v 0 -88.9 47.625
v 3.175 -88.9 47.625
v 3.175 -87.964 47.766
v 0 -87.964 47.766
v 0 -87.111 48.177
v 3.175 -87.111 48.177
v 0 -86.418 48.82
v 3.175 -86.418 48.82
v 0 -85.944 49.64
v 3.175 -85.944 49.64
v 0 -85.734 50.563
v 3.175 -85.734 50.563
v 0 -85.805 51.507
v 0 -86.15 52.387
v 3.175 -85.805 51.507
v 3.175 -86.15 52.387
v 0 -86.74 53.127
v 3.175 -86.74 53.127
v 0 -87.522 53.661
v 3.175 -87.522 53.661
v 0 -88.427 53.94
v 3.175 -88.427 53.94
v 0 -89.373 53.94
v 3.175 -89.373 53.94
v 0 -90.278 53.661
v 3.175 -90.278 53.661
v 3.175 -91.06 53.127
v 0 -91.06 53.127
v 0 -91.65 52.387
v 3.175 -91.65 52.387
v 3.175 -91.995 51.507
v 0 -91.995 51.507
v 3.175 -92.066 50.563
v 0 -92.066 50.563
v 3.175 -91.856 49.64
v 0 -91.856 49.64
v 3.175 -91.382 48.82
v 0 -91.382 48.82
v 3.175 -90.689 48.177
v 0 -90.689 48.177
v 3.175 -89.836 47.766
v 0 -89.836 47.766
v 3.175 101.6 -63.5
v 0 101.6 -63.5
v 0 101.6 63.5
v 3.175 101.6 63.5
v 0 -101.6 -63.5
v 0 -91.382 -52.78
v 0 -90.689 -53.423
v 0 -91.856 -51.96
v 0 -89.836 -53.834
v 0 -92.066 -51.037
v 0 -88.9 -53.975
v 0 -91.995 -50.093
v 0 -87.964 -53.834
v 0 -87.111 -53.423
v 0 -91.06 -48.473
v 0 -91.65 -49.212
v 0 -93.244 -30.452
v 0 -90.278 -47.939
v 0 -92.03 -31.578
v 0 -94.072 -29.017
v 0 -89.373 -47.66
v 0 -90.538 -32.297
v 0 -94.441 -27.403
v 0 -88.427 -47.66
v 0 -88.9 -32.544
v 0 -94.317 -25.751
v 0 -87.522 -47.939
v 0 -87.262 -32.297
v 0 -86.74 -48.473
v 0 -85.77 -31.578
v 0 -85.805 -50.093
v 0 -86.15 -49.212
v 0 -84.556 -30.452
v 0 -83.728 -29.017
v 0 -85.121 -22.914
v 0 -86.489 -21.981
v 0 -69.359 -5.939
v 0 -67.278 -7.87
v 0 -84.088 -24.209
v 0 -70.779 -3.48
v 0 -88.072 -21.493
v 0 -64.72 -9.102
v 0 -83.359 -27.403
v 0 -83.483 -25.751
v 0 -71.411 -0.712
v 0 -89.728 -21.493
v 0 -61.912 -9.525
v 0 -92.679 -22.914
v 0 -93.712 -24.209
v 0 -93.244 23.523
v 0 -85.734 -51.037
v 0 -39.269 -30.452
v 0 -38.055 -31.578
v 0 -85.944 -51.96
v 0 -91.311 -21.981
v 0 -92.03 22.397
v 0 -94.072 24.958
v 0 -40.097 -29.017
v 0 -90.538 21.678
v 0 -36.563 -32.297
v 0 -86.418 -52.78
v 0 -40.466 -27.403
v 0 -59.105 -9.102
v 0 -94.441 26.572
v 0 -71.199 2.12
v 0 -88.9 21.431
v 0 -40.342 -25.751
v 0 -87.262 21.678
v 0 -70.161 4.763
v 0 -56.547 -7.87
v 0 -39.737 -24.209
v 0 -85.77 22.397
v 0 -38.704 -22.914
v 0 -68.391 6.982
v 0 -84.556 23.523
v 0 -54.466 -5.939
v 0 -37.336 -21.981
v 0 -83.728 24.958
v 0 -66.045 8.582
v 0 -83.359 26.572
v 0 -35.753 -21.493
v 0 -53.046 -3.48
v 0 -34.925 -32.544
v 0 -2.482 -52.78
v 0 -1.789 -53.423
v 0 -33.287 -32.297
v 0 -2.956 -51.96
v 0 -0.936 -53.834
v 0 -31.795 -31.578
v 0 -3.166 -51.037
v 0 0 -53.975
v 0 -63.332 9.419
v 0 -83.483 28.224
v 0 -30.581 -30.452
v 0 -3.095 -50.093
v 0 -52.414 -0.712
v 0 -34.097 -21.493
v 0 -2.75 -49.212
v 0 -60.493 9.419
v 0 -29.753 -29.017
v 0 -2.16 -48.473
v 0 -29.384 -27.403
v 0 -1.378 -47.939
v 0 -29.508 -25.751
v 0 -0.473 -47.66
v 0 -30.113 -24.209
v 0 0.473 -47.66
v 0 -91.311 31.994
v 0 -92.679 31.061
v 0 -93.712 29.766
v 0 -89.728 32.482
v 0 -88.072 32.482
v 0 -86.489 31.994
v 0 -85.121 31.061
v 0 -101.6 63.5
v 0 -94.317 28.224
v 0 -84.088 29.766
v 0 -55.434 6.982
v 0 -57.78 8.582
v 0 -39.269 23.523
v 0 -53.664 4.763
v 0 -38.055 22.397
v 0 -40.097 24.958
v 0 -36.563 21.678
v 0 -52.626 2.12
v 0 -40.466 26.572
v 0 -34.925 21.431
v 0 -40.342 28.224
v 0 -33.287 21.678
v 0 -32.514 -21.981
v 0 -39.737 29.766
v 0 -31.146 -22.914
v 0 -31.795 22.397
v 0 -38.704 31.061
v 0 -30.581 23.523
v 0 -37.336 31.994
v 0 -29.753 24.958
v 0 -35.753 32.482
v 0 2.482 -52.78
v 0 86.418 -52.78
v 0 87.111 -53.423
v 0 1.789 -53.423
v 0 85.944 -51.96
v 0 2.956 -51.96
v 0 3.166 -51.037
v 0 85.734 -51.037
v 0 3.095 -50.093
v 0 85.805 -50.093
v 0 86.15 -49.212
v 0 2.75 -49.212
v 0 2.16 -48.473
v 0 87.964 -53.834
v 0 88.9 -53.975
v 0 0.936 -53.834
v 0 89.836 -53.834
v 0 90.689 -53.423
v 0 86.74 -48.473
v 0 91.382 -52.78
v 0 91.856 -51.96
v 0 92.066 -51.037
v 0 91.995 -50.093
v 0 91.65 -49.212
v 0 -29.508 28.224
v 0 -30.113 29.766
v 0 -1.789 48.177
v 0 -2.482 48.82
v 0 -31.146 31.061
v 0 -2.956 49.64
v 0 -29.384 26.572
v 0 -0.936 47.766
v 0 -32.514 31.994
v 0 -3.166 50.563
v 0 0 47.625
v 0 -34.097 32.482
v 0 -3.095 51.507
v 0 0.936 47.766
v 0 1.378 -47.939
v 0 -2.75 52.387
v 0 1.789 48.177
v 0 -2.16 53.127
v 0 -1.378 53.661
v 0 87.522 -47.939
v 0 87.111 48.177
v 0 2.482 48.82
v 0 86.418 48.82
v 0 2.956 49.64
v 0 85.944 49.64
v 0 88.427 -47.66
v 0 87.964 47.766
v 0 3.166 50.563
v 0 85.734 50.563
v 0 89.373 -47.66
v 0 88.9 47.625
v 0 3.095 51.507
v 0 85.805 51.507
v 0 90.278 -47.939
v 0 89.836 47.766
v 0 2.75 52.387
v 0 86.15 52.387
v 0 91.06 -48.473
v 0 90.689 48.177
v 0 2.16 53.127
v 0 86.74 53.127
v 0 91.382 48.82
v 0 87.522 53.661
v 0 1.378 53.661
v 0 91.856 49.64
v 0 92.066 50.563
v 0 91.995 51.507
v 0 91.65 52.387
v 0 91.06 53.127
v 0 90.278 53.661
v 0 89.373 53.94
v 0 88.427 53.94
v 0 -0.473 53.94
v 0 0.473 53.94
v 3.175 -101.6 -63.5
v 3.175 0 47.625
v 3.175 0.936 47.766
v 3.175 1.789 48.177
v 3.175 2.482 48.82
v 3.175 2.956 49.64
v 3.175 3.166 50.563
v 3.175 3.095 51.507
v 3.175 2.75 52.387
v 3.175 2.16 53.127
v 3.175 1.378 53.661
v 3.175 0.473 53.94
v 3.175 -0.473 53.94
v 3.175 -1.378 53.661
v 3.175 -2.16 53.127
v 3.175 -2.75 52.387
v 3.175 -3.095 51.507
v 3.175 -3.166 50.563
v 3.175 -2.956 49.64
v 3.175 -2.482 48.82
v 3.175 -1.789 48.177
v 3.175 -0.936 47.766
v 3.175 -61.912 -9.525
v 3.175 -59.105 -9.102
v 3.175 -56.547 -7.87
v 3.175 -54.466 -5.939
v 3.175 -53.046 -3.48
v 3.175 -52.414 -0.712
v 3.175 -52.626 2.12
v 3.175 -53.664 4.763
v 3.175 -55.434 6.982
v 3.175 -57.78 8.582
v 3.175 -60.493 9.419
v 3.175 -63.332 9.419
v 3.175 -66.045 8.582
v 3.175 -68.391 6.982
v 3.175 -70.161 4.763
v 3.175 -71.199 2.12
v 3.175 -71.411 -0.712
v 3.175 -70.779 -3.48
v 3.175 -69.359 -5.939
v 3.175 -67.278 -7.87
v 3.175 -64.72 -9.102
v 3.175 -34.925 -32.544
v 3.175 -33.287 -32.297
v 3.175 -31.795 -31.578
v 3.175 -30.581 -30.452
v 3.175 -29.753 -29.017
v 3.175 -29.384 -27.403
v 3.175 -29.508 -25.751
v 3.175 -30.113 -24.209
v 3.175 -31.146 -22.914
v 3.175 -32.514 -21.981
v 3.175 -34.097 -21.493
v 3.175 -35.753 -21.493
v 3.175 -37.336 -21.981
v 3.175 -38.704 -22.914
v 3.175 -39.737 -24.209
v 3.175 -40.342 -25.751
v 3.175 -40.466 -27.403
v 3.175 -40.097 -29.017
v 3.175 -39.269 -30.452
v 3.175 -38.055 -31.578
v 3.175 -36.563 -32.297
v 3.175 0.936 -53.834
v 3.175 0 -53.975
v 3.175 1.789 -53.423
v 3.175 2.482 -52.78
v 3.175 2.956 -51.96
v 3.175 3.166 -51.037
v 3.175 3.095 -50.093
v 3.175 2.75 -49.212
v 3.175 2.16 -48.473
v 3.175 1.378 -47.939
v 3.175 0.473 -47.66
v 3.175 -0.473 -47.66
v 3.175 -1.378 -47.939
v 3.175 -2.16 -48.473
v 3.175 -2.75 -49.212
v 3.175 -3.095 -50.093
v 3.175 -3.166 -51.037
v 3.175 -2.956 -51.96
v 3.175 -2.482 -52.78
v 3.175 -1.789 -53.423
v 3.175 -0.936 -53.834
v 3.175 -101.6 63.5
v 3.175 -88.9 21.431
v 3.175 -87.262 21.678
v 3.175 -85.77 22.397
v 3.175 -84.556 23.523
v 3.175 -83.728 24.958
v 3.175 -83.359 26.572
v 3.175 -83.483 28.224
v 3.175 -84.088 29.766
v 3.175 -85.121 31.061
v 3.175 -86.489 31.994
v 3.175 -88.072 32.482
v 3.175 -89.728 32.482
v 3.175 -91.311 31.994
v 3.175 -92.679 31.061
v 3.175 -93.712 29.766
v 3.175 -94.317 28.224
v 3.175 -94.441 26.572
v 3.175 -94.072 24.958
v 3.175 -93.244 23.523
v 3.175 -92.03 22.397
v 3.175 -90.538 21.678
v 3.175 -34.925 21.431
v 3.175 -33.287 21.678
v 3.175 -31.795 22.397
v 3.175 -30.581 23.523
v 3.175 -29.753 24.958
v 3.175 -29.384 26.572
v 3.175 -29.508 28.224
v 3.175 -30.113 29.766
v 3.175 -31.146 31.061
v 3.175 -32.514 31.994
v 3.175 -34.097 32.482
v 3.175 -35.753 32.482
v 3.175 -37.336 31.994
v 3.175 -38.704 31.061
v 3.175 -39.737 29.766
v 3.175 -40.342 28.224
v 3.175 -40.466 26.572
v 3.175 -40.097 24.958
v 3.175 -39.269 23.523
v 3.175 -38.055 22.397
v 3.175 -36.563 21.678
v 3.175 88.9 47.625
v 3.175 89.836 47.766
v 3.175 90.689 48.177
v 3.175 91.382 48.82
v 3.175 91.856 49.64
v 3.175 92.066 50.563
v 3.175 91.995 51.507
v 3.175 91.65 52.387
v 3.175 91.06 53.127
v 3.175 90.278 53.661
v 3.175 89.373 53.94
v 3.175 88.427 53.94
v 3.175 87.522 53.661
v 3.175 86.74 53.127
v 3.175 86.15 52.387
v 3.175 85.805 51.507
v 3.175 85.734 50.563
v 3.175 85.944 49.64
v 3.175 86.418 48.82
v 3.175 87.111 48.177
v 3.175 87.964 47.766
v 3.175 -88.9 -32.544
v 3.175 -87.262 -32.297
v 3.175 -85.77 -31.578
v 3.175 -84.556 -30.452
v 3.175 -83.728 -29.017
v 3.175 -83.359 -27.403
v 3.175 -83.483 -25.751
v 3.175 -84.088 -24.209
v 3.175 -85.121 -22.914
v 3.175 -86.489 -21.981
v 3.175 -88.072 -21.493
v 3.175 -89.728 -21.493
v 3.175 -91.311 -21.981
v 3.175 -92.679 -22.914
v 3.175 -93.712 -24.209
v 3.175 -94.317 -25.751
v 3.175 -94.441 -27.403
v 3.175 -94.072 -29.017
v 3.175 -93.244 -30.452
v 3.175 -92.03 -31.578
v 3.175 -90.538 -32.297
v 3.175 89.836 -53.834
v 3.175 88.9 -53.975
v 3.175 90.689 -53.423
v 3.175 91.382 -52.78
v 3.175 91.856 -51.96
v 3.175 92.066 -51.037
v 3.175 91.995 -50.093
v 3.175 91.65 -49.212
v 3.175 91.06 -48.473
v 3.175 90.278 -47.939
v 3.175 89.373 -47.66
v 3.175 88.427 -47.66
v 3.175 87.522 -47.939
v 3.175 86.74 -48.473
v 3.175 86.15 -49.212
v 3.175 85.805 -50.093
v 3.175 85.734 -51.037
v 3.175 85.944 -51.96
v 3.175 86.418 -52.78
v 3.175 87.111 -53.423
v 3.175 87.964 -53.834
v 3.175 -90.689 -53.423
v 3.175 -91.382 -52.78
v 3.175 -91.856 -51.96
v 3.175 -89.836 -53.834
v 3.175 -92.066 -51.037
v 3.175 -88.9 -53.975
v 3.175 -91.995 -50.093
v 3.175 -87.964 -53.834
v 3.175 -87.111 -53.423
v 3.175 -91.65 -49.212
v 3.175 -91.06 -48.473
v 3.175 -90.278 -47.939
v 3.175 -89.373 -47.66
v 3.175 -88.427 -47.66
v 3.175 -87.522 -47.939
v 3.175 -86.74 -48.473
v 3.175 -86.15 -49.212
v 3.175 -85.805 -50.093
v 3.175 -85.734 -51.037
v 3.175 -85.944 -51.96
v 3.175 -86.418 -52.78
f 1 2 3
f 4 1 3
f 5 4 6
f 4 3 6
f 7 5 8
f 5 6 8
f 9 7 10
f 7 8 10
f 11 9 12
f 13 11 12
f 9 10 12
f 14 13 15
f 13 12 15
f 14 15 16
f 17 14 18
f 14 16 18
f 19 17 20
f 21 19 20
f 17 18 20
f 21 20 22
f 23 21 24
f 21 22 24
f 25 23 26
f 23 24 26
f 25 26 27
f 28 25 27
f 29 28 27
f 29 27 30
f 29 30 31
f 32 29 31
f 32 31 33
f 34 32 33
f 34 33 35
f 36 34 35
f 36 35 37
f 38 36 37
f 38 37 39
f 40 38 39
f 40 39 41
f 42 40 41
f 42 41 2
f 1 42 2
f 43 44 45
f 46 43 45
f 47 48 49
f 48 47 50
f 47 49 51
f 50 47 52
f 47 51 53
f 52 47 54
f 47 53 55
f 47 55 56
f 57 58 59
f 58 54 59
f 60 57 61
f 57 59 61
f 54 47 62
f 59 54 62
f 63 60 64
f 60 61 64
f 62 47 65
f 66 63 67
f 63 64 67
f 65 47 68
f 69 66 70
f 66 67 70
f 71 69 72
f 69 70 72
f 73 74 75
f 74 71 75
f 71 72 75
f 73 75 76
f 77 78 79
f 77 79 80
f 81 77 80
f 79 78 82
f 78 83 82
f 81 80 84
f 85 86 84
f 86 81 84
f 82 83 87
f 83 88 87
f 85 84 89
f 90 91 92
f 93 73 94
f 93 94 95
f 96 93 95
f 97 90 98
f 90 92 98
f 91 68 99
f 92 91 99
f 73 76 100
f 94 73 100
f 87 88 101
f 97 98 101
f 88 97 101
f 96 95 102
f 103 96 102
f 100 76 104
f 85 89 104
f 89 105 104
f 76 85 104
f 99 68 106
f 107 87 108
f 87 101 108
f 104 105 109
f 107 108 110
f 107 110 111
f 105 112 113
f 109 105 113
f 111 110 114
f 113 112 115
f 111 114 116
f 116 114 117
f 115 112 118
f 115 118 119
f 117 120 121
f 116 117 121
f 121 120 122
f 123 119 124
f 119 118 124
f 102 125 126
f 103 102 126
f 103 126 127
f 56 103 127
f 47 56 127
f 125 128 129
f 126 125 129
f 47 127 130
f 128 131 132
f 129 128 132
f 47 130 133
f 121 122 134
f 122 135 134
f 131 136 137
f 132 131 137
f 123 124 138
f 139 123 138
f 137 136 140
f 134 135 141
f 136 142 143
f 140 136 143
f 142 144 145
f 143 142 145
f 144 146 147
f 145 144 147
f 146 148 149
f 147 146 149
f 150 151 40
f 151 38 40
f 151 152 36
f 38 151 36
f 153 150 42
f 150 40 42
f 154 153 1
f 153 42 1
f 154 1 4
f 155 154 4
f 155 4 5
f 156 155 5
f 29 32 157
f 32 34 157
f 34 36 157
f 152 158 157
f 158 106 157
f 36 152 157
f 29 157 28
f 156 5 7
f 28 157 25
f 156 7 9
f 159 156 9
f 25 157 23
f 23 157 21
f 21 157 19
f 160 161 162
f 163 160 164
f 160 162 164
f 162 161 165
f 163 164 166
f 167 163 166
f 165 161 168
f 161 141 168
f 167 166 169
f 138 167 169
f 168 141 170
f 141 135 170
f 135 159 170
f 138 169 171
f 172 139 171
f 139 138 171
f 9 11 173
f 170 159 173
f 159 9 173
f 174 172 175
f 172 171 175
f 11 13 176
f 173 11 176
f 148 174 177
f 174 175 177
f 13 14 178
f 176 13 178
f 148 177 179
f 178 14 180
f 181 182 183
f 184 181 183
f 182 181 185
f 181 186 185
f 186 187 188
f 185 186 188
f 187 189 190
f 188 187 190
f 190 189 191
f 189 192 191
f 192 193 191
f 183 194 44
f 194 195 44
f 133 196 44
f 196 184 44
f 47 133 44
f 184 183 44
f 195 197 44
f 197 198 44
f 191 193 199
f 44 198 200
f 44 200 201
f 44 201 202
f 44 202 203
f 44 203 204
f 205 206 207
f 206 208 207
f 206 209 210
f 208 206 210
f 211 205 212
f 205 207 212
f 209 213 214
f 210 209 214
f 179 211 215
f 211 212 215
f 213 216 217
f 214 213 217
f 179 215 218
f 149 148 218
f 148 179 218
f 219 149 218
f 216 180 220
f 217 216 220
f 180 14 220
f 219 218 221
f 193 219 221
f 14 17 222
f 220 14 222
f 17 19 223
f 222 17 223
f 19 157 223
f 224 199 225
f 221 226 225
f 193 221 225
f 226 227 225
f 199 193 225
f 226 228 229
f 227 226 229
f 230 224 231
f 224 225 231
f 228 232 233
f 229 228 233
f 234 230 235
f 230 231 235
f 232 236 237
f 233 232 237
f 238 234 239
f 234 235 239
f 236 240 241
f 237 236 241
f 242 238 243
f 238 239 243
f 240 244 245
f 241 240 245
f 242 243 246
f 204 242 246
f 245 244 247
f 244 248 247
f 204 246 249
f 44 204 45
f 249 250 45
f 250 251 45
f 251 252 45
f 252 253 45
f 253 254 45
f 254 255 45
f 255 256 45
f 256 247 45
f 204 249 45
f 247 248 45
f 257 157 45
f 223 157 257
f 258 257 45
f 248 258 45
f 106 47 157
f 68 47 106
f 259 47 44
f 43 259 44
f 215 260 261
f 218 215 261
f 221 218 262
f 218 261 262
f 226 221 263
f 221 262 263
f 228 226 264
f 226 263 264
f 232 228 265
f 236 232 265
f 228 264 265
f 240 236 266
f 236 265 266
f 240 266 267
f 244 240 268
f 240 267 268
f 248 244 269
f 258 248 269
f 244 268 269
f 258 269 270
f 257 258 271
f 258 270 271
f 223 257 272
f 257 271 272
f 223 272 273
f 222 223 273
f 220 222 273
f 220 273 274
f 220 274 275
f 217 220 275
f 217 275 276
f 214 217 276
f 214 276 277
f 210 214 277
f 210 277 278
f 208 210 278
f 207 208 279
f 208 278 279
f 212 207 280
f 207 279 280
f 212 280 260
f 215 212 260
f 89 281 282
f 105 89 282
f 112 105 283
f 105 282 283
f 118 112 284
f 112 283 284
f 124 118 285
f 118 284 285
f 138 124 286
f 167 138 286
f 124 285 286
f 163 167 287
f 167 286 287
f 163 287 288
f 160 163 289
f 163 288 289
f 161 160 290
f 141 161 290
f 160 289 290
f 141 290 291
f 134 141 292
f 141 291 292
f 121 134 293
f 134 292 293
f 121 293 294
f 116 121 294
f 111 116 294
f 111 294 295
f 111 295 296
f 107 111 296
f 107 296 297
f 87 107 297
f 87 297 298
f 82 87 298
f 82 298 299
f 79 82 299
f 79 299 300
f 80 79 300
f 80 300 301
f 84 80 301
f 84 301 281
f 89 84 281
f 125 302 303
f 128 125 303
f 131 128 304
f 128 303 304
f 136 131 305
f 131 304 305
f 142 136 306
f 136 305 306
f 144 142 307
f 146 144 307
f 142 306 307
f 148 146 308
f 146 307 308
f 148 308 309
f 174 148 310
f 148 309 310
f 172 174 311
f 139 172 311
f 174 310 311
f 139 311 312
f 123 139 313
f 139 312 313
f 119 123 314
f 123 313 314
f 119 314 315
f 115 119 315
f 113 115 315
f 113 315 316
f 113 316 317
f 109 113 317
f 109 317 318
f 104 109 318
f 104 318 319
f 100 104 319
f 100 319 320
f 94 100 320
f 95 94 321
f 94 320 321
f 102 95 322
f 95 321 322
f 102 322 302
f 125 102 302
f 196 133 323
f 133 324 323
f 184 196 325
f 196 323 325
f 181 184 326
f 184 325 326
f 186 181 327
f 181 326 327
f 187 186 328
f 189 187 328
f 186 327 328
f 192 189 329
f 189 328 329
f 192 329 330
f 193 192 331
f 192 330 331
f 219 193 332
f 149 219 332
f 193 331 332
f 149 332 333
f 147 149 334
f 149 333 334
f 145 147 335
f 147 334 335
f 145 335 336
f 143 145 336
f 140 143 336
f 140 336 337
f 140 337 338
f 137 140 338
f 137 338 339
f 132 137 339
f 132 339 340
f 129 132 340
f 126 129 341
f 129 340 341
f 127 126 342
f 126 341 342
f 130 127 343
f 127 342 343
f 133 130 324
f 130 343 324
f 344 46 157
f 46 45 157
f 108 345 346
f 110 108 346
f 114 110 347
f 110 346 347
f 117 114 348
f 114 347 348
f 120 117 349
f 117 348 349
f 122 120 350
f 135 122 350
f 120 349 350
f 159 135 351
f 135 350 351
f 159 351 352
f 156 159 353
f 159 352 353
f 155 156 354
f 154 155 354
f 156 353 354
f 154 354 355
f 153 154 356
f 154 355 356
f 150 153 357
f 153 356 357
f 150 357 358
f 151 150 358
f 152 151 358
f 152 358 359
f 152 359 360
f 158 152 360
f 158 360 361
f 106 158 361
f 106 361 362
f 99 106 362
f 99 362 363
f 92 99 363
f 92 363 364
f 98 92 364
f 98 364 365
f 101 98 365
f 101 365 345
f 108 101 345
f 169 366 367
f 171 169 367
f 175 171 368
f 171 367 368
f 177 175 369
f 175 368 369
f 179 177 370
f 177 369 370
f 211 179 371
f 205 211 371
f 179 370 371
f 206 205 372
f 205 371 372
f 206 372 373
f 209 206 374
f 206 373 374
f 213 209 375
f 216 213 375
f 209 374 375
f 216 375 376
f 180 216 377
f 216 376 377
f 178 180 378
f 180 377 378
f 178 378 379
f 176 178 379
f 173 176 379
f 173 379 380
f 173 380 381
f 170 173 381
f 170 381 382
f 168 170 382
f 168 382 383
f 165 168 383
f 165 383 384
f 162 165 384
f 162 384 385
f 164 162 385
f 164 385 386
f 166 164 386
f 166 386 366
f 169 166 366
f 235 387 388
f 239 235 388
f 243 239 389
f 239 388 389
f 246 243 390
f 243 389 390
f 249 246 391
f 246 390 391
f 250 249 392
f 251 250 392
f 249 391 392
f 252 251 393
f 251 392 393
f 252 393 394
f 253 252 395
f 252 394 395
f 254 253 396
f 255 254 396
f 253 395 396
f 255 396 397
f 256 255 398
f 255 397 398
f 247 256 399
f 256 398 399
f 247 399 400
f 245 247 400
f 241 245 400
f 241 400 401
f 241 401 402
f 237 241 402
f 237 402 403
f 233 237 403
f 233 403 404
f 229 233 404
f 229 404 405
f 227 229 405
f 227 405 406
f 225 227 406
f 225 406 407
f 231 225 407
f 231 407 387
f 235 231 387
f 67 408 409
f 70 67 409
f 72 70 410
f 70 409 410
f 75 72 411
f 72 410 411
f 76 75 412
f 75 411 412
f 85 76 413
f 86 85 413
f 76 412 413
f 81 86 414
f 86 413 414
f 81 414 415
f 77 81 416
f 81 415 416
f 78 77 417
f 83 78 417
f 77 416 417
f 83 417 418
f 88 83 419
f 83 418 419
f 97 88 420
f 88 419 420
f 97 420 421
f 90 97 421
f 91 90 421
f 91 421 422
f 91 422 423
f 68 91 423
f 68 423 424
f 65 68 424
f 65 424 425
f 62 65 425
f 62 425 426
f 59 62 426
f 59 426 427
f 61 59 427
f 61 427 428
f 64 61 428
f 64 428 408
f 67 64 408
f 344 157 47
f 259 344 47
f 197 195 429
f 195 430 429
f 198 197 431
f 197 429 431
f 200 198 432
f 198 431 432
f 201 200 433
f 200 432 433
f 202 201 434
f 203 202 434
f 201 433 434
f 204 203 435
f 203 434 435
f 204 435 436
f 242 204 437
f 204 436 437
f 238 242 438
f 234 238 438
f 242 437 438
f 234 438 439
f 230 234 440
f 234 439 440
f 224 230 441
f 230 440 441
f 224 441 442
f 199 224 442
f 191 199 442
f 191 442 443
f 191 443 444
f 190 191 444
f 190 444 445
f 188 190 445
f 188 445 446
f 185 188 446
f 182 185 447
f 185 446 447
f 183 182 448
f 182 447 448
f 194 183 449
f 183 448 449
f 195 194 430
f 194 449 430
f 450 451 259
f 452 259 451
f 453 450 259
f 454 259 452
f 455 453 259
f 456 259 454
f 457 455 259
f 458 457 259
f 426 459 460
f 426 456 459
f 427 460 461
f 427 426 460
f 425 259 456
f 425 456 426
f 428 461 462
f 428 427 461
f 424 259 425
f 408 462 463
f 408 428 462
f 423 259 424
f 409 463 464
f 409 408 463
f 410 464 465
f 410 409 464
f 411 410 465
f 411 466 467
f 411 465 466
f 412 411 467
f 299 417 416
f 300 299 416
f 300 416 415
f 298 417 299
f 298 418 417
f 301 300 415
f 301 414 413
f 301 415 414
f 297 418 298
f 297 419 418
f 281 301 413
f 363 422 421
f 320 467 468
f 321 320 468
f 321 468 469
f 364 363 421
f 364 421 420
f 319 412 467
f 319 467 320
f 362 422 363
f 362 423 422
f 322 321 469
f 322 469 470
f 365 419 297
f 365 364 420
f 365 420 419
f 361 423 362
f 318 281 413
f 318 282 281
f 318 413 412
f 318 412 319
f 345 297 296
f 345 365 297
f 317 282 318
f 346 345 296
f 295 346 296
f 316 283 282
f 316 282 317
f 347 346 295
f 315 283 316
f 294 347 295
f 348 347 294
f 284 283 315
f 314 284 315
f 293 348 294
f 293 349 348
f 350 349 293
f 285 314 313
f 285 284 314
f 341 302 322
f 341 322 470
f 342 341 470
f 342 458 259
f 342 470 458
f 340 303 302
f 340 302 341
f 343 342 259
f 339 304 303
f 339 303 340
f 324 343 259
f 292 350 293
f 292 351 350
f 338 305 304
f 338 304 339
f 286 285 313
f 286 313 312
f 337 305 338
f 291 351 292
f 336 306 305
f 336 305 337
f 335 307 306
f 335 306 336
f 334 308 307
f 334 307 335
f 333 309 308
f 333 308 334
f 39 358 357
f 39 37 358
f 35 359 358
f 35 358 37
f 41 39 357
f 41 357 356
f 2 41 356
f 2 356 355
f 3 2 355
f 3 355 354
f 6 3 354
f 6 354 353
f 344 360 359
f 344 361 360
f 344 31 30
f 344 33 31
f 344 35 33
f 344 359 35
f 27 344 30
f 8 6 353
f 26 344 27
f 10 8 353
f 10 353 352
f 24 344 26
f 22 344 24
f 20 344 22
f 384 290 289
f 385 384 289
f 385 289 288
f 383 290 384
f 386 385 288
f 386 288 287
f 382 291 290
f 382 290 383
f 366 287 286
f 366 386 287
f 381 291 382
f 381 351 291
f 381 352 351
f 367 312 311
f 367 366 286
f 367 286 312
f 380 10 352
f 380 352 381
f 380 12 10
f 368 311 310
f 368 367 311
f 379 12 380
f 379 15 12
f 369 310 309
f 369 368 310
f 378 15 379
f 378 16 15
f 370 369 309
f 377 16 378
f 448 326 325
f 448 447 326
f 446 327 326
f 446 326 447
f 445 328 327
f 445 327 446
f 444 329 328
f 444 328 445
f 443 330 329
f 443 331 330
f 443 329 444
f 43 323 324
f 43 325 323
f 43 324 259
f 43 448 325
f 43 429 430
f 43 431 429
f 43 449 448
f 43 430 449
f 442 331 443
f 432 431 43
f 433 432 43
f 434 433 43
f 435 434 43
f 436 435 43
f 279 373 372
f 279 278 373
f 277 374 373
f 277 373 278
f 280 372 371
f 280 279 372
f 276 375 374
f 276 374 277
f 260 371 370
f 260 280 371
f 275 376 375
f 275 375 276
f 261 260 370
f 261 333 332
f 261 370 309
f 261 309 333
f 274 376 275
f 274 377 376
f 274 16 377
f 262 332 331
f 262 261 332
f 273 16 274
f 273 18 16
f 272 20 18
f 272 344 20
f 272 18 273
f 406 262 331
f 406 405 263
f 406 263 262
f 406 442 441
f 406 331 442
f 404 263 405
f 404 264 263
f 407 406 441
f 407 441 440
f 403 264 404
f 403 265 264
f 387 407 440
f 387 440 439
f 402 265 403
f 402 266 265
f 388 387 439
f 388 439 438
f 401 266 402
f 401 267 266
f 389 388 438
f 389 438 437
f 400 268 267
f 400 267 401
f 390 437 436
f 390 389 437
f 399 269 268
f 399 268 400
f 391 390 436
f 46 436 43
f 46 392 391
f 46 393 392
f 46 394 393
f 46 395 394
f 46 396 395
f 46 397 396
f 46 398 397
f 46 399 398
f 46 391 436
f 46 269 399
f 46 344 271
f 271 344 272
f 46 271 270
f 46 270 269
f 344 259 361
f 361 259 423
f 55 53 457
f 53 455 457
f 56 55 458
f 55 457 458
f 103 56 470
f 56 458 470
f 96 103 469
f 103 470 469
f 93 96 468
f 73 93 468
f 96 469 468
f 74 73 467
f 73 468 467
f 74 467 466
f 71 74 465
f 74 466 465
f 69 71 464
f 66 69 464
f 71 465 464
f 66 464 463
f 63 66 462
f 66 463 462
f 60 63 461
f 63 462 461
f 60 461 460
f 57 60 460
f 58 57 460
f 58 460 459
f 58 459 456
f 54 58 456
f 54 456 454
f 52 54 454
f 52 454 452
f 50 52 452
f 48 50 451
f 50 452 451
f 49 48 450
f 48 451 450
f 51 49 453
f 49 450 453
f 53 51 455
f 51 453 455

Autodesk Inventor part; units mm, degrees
ref_plane "YZ Plane" through (0, 0, 0) normal (1, 0, 0) x (0, 1, 0)
ref_plane "XZ Plane" through (0, 0, 0) normal (0, 1, 0) x (-1, 0, 0)
ref_plane "XY Plane" through (0, 0, 0) normal (0, 0, 1) x (1, 0, 0)
sketch "Sketch1" plane through (0, 0, 0) normal (1, 0, 0) x (0, 1, 0)
  line L0 (0, -88.9) -> (0, 88.9) construction
  line L1 (-142.24, 0) -> (142.24, 0) construction
  line L2 (101.6, 63.5) -> (-101.6, 63.5)
  line L3 (-101.6, 63.5) -> (-101.6, -63.5)
  line L4 (-101.6, -63.5) -> (101.6, -63.5)
  line L5 (101.6, -63.5) -> (101.6, 63.5)
  point P0 (0, 0)
  point P1 (0, 63.5)
  point P2 (101.6, 0)
  dimension "d0" = 203.2
  dimension "d1" = 127
extrude "Extrusion1" add sketch "Sketch1" along normal blind 3.175
sketch "Sketch2" plane through (3.175, 0, 0) normal (1, 0, 0) x (0, 0, -1)
  line L0 (88.9, 0) -> (-88.9, 0) construction
  line L1 (0, -142.24) -> (0, 142.24) construction
  line L2 (-38.1, -23.8125) -> (38.1, -23.8125) construction
  line L3 (38.1, -23.8125) -> (38.1, -100.0125) construction
  line L4 (38.1, -100.0125) -> (-38.1, -100.0125) construction
  line L5 (-38.1, -100.0125) -> (-38.1, -23.8125) construction
  line L6 (-26.9875, -34.925) -> (26.9875, -34.925) construction
  line L7 (26.9875, -34.925) -> (26.9875, -88.9) construction
  line L8 (26.9875, -88.9) -> (-26.9875, -88.9) construction
  line L9 (-26.9875, -88.9) -> (-26.9875, -34.925) construction
  line L10 (-38.1, -61.9125) -> (38.1, -61.9125) construction
  circle A0 centre (-26.9875, -34.925) radius 5.5563
  circle A1 centre (26.9875, -34.925) radius 5.5563
  circle A2 centre (-26.9875, -88.9) radius 5.5563
  circle A3 centre (26.9875, -88.9) radius 5.5563
  line L11 (-63.5, -101.6) -> (63.5, -101.6) construction
  circle A4 centre (0, -61.9125) radius 9.525
  point P0 (0, 0)
  point P1 (0, -23.8125)
  point P2 (0, -34.925)
  point P3 (-26.9875, -61.9125)
  dimension "d4" = 76.2
  dimension "d5" = 53.975
  dimension "d6" = 11.1125
  dimension "d8" = 19.05
  dimension "d29" = 12.7
extrude "Extrusion2" cut sketch "Sketch2" against normal through all
sketch "Sketch4" plane through (3.175, 0, 0) normal (1, 0, 0) x (0, 0, -1)
  line L0 (88.9, 0) -> (-88.9, 0) construction
  line L1 (0, -144.4625) -> (0, 144.4625) construction
  line L2 (-63.5, 101.6) -> (-38.1, 101.6) construction
  line L3 (-38.1, 101.6) -> (-38.1, -101.6) construction
  line L4 (-38.1, -101.6) -> (-63.5, -101.6) construction
  line L5 (-63.5, -101.6) -> (-63.5, 101.6) construction
  line L6 (-50.8, 101.6) -> (-50.8, -101.6) construction
  line L7 (-38.1, 76.2) -> (-63.5, 76.2) construction
  line L8 (-38.1, 88.9) -> (-63.5, 88.9) construction
  circle A0 centre (-50.8, 88.9) radius 3.175
  circle A1 centre (-50.8, 0) radius 3.175
  circle A2 centre (-50.8, -88.9) radius 3.175
  circle A3 centre (50.8, 88.9) radius 3.175
  circle A4 centre (50.8, 0) radius 3.175
  circle A5 centre (50.8, -88.9) radius 3.175
  point P0 (0, 0)
  dimension "d30" = 25.4
  dimension "d31" = 25.4
  dimension "d32" = 6.35
extrude "Extrusion4" cut sketch "Sketch4" against normal through all
properties part number "Lateral Plate" material "Aluminum 6061"
